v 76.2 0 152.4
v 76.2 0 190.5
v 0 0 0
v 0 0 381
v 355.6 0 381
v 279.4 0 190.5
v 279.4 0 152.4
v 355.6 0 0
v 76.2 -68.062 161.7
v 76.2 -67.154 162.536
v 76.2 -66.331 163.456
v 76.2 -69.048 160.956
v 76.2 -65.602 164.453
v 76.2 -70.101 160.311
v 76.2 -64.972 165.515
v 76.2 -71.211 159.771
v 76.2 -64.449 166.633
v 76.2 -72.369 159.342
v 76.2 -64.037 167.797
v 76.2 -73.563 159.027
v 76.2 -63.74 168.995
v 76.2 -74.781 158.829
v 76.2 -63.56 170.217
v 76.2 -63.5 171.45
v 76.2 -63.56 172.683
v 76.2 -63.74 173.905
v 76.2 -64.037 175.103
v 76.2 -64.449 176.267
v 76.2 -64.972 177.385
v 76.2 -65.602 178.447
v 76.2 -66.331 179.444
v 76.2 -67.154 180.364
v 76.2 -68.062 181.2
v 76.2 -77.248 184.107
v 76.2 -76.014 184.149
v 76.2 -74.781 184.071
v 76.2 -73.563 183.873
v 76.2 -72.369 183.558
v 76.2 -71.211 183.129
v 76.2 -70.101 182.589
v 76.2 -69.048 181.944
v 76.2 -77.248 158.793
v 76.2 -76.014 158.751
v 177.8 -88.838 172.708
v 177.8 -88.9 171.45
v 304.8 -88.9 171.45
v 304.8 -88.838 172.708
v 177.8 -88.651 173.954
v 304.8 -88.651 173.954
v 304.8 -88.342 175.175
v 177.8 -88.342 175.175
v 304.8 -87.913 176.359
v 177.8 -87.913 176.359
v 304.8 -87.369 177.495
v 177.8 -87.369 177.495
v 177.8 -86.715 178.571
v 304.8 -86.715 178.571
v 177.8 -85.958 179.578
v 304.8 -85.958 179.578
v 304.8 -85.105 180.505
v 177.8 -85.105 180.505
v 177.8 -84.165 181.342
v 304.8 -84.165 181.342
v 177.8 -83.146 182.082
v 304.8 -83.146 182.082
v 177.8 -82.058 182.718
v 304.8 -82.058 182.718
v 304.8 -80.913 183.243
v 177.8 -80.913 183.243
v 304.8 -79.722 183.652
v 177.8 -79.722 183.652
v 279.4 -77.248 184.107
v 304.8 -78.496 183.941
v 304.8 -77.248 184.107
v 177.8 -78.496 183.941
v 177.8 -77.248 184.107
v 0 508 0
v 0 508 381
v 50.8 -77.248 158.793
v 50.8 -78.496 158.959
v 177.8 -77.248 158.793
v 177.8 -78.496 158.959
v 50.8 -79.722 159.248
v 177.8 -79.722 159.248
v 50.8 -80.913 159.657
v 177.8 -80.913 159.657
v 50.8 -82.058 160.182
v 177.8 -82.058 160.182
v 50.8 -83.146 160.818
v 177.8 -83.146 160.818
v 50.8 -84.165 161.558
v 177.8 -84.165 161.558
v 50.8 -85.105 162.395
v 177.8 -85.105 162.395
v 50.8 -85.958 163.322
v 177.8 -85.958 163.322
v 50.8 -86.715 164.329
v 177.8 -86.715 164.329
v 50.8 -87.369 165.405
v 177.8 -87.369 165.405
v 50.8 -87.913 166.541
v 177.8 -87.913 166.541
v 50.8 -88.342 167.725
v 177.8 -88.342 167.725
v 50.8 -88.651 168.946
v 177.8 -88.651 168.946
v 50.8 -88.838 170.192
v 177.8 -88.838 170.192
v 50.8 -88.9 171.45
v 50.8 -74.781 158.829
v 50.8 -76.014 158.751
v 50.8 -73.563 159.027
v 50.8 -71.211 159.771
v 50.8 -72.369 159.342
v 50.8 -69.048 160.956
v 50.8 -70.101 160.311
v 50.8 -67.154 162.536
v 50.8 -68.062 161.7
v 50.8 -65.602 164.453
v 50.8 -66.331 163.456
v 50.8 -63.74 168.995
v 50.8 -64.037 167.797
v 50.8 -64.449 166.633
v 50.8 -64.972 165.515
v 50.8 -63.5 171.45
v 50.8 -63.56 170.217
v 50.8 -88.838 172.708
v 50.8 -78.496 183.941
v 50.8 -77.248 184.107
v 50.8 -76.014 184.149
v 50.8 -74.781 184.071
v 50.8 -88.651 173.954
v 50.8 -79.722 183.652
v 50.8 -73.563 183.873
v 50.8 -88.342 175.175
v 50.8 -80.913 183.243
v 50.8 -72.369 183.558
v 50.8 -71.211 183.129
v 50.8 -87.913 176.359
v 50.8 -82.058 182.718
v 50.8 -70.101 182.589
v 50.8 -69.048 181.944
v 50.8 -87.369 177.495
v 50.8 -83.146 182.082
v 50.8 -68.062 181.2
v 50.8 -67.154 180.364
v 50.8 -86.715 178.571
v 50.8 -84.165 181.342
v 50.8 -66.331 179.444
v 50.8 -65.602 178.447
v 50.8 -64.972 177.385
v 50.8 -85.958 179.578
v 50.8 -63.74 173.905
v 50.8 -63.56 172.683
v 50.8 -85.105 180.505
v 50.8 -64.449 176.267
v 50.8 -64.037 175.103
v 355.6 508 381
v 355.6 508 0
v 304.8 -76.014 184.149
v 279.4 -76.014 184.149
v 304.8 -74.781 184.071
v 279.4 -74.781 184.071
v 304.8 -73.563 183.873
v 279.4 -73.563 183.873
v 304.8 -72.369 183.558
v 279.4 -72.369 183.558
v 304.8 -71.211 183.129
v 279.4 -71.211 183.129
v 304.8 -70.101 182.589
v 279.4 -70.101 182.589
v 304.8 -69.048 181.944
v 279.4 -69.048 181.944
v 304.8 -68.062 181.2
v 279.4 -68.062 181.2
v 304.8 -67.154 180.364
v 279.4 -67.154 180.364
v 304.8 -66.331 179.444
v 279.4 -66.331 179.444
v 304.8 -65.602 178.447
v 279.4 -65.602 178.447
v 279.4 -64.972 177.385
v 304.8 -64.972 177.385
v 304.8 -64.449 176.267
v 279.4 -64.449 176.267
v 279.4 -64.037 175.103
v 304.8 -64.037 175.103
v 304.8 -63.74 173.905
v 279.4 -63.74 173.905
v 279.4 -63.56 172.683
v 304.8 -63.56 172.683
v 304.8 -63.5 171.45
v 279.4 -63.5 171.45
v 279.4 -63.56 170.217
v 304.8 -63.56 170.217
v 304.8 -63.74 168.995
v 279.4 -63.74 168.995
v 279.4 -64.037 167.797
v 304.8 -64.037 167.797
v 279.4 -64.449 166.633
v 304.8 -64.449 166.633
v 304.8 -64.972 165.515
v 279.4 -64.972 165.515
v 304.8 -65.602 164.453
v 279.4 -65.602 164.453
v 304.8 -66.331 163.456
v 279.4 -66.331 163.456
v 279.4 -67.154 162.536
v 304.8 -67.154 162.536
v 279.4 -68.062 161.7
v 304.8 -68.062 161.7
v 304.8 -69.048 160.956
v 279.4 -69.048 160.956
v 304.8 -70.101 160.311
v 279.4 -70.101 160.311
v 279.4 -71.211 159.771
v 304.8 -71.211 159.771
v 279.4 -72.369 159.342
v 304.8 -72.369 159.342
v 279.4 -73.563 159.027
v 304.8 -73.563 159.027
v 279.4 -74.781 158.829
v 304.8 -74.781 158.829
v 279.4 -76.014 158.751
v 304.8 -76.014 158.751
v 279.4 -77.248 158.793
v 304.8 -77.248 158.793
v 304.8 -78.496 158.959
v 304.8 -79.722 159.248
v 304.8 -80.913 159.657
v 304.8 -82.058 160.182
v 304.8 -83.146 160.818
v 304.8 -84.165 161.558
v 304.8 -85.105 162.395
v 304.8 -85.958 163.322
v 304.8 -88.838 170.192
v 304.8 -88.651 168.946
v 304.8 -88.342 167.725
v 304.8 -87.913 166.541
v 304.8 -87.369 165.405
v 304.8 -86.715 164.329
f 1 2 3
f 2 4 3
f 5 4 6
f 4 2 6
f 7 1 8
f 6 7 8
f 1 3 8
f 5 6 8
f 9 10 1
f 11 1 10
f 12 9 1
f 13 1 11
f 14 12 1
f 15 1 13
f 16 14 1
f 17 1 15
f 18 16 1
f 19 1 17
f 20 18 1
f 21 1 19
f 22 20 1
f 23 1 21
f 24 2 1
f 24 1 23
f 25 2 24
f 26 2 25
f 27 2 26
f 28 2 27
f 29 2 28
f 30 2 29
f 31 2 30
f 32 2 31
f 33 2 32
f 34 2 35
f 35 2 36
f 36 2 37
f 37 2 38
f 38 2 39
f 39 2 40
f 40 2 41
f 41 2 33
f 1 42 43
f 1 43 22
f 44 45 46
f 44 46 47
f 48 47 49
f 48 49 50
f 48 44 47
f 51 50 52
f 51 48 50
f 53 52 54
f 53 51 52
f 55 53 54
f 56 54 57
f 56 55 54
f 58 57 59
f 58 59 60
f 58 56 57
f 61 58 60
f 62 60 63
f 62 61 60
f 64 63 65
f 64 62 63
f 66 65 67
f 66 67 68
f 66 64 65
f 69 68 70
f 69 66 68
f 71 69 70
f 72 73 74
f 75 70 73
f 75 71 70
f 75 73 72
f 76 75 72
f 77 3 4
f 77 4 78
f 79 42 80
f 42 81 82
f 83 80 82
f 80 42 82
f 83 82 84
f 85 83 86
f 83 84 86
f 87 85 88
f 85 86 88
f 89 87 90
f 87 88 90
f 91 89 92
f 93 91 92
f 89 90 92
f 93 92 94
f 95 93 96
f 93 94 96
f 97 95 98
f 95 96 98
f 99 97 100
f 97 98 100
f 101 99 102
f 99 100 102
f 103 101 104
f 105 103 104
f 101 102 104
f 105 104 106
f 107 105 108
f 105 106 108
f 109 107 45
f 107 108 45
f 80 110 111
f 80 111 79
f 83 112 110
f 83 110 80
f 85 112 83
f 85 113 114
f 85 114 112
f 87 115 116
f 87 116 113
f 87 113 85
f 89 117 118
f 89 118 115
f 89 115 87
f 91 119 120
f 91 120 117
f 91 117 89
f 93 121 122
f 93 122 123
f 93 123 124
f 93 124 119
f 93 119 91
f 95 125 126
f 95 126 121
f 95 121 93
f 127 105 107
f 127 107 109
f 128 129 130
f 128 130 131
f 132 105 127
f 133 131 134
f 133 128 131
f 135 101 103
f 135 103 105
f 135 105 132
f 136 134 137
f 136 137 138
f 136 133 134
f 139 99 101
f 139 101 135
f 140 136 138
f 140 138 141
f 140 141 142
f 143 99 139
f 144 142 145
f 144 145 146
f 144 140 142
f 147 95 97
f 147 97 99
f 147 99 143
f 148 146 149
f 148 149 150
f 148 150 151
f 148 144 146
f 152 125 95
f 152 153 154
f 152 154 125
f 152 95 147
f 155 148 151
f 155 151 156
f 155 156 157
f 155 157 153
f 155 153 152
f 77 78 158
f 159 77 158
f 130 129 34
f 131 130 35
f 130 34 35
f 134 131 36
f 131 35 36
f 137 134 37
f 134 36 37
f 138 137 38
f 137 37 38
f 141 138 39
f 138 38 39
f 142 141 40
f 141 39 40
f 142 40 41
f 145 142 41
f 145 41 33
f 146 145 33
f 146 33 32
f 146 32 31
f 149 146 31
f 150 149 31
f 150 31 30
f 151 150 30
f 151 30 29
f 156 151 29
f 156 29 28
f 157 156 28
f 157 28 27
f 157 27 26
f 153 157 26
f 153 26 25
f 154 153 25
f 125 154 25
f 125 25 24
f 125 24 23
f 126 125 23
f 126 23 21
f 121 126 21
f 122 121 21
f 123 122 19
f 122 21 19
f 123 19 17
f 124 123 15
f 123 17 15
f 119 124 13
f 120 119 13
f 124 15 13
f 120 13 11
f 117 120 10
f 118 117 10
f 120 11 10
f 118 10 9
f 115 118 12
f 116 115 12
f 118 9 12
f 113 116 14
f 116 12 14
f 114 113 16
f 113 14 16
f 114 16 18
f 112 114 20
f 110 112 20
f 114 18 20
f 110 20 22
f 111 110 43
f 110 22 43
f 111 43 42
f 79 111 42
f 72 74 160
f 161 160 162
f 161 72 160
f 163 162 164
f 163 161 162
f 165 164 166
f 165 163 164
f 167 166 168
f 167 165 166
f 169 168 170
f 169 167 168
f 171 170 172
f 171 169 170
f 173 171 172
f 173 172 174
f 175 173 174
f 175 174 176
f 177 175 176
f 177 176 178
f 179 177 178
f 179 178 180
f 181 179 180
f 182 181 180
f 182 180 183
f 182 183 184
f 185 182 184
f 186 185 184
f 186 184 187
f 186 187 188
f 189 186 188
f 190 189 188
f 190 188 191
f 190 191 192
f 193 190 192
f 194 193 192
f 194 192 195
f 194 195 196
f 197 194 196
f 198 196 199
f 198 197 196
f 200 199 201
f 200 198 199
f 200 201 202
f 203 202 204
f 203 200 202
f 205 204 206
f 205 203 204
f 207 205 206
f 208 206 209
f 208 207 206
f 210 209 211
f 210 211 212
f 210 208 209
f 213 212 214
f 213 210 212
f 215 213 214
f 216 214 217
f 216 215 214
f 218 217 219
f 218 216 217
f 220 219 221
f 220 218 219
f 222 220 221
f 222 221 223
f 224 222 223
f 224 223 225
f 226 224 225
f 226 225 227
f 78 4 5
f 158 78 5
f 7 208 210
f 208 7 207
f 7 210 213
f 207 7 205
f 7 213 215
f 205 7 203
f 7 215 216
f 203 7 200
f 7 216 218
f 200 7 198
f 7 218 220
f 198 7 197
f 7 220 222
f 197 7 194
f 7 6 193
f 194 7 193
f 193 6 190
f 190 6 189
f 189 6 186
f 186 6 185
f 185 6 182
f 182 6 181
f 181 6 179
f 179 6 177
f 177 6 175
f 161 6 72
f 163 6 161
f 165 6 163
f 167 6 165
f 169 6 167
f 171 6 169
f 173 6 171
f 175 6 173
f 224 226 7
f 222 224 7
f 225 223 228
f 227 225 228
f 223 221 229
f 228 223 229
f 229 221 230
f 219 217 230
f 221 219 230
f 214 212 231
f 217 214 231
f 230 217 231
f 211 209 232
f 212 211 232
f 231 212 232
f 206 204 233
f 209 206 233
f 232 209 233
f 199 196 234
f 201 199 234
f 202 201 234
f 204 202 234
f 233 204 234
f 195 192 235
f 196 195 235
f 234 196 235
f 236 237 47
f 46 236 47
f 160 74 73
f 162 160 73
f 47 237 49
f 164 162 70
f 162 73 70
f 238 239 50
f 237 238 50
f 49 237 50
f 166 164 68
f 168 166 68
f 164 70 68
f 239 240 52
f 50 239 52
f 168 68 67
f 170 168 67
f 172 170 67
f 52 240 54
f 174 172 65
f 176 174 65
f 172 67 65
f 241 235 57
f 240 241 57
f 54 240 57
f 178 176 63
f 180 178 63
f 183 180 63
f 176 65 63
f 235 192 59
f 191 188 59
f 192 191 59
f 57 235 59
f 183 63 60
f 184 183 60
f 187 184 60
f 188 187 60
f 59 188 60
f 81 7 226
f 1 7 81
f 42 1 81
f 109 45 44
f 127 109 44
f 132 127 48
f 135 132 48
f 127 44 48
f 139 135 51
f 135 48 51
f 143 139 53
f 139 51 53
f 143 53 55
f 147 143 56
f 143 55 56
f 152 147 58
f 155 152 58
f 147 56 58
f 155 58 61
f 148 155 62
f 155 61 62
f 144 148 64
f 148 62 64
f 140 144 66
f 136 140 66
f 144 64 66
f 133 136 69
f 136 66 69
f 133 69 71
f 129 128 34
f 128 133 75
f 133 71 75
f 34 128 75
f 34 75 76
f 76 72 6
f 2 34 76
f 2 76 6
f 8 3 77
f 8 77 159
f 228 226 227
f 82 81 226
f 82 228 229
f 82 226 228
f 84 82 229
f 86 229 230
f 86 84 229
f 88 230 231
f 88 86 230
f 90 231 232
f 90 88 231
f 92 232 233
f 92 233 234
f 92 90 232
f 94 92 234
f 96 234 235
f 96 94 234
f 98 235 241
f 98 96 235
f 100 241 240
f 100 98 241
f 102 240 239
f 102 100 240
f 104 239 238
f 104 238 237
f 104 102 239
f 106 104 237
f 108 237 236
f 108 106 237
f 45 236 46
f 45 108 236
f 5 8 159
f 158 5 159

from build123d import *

# Parameters (mm, degrees)
F0_W          = 355.6
F0_H          = 508
F1_DEPTH      = 381
F4_DEPTH      = 101.6
F4_DEPTH_BACK = 101.6
F5_DEPTH      = 127
F5_DEPTH_BACK = 127


with BuildPart() as f1:
    # F0 (on Top) → F1 (new body)
    with BuildSketch(Plane.XY):
        with Locations((177.8, 254)):
            Rectangle(F0_W, F0_H)
    extrude(amount=F1_DEPTH)

    # F3 (on mid) → F4 (join, two sides)
    with BuildSketch(Plane(origin=(177.8, 0, 0), x_dir=(0, -1, 0), z_dir=(-1, 0, 0))) as f4_sk:
        with BuildLine():
            ThreePointArc((77.2475148298, 158.7932740141), (63.5, 171.45), (77.2475148298, 184.1067259859))
            Line((77.2475148298, 184.1067259859), (0, 190.5))
            Line((0, 190.5), (0, 152.4))
            Line((0, 152.4), (77.2475148298, 158.7932740141))
        make_face()
    extrude(amount=F4_DEPTH)
    extrude(f4_sk.sketch, amount=-F4_DEPTH_BACK)

    # F3 (on mid) → F5 (join, two sides)
    with BuildSketch(Plane(origin=(177.8, 0, 0), x_dir=(0, -1, 0), z_dir=(-1, 0, 0))) as f5_sk:
        with BuildLine():
            ThreePointArc((77.2475148298, 158.7932740141), (85.5432713312, 162.8480652856), (88.9, 171.45))
            ThreePointArc((88.9, 171.45), (85.5432713312, 180.0519347144), (77.2475148298, 184.1067259859))
            ThreePointArc((77.2475148298, 184.1067259859), (63.5, 171.45), (77.2475148298, 158.7932740141))
        make_face()
    extrude(amount=F5_DEPTH)
    extrude(f5_sk.sketch, amount=-F5_DEPTH_BACK)


solid = f1.part
